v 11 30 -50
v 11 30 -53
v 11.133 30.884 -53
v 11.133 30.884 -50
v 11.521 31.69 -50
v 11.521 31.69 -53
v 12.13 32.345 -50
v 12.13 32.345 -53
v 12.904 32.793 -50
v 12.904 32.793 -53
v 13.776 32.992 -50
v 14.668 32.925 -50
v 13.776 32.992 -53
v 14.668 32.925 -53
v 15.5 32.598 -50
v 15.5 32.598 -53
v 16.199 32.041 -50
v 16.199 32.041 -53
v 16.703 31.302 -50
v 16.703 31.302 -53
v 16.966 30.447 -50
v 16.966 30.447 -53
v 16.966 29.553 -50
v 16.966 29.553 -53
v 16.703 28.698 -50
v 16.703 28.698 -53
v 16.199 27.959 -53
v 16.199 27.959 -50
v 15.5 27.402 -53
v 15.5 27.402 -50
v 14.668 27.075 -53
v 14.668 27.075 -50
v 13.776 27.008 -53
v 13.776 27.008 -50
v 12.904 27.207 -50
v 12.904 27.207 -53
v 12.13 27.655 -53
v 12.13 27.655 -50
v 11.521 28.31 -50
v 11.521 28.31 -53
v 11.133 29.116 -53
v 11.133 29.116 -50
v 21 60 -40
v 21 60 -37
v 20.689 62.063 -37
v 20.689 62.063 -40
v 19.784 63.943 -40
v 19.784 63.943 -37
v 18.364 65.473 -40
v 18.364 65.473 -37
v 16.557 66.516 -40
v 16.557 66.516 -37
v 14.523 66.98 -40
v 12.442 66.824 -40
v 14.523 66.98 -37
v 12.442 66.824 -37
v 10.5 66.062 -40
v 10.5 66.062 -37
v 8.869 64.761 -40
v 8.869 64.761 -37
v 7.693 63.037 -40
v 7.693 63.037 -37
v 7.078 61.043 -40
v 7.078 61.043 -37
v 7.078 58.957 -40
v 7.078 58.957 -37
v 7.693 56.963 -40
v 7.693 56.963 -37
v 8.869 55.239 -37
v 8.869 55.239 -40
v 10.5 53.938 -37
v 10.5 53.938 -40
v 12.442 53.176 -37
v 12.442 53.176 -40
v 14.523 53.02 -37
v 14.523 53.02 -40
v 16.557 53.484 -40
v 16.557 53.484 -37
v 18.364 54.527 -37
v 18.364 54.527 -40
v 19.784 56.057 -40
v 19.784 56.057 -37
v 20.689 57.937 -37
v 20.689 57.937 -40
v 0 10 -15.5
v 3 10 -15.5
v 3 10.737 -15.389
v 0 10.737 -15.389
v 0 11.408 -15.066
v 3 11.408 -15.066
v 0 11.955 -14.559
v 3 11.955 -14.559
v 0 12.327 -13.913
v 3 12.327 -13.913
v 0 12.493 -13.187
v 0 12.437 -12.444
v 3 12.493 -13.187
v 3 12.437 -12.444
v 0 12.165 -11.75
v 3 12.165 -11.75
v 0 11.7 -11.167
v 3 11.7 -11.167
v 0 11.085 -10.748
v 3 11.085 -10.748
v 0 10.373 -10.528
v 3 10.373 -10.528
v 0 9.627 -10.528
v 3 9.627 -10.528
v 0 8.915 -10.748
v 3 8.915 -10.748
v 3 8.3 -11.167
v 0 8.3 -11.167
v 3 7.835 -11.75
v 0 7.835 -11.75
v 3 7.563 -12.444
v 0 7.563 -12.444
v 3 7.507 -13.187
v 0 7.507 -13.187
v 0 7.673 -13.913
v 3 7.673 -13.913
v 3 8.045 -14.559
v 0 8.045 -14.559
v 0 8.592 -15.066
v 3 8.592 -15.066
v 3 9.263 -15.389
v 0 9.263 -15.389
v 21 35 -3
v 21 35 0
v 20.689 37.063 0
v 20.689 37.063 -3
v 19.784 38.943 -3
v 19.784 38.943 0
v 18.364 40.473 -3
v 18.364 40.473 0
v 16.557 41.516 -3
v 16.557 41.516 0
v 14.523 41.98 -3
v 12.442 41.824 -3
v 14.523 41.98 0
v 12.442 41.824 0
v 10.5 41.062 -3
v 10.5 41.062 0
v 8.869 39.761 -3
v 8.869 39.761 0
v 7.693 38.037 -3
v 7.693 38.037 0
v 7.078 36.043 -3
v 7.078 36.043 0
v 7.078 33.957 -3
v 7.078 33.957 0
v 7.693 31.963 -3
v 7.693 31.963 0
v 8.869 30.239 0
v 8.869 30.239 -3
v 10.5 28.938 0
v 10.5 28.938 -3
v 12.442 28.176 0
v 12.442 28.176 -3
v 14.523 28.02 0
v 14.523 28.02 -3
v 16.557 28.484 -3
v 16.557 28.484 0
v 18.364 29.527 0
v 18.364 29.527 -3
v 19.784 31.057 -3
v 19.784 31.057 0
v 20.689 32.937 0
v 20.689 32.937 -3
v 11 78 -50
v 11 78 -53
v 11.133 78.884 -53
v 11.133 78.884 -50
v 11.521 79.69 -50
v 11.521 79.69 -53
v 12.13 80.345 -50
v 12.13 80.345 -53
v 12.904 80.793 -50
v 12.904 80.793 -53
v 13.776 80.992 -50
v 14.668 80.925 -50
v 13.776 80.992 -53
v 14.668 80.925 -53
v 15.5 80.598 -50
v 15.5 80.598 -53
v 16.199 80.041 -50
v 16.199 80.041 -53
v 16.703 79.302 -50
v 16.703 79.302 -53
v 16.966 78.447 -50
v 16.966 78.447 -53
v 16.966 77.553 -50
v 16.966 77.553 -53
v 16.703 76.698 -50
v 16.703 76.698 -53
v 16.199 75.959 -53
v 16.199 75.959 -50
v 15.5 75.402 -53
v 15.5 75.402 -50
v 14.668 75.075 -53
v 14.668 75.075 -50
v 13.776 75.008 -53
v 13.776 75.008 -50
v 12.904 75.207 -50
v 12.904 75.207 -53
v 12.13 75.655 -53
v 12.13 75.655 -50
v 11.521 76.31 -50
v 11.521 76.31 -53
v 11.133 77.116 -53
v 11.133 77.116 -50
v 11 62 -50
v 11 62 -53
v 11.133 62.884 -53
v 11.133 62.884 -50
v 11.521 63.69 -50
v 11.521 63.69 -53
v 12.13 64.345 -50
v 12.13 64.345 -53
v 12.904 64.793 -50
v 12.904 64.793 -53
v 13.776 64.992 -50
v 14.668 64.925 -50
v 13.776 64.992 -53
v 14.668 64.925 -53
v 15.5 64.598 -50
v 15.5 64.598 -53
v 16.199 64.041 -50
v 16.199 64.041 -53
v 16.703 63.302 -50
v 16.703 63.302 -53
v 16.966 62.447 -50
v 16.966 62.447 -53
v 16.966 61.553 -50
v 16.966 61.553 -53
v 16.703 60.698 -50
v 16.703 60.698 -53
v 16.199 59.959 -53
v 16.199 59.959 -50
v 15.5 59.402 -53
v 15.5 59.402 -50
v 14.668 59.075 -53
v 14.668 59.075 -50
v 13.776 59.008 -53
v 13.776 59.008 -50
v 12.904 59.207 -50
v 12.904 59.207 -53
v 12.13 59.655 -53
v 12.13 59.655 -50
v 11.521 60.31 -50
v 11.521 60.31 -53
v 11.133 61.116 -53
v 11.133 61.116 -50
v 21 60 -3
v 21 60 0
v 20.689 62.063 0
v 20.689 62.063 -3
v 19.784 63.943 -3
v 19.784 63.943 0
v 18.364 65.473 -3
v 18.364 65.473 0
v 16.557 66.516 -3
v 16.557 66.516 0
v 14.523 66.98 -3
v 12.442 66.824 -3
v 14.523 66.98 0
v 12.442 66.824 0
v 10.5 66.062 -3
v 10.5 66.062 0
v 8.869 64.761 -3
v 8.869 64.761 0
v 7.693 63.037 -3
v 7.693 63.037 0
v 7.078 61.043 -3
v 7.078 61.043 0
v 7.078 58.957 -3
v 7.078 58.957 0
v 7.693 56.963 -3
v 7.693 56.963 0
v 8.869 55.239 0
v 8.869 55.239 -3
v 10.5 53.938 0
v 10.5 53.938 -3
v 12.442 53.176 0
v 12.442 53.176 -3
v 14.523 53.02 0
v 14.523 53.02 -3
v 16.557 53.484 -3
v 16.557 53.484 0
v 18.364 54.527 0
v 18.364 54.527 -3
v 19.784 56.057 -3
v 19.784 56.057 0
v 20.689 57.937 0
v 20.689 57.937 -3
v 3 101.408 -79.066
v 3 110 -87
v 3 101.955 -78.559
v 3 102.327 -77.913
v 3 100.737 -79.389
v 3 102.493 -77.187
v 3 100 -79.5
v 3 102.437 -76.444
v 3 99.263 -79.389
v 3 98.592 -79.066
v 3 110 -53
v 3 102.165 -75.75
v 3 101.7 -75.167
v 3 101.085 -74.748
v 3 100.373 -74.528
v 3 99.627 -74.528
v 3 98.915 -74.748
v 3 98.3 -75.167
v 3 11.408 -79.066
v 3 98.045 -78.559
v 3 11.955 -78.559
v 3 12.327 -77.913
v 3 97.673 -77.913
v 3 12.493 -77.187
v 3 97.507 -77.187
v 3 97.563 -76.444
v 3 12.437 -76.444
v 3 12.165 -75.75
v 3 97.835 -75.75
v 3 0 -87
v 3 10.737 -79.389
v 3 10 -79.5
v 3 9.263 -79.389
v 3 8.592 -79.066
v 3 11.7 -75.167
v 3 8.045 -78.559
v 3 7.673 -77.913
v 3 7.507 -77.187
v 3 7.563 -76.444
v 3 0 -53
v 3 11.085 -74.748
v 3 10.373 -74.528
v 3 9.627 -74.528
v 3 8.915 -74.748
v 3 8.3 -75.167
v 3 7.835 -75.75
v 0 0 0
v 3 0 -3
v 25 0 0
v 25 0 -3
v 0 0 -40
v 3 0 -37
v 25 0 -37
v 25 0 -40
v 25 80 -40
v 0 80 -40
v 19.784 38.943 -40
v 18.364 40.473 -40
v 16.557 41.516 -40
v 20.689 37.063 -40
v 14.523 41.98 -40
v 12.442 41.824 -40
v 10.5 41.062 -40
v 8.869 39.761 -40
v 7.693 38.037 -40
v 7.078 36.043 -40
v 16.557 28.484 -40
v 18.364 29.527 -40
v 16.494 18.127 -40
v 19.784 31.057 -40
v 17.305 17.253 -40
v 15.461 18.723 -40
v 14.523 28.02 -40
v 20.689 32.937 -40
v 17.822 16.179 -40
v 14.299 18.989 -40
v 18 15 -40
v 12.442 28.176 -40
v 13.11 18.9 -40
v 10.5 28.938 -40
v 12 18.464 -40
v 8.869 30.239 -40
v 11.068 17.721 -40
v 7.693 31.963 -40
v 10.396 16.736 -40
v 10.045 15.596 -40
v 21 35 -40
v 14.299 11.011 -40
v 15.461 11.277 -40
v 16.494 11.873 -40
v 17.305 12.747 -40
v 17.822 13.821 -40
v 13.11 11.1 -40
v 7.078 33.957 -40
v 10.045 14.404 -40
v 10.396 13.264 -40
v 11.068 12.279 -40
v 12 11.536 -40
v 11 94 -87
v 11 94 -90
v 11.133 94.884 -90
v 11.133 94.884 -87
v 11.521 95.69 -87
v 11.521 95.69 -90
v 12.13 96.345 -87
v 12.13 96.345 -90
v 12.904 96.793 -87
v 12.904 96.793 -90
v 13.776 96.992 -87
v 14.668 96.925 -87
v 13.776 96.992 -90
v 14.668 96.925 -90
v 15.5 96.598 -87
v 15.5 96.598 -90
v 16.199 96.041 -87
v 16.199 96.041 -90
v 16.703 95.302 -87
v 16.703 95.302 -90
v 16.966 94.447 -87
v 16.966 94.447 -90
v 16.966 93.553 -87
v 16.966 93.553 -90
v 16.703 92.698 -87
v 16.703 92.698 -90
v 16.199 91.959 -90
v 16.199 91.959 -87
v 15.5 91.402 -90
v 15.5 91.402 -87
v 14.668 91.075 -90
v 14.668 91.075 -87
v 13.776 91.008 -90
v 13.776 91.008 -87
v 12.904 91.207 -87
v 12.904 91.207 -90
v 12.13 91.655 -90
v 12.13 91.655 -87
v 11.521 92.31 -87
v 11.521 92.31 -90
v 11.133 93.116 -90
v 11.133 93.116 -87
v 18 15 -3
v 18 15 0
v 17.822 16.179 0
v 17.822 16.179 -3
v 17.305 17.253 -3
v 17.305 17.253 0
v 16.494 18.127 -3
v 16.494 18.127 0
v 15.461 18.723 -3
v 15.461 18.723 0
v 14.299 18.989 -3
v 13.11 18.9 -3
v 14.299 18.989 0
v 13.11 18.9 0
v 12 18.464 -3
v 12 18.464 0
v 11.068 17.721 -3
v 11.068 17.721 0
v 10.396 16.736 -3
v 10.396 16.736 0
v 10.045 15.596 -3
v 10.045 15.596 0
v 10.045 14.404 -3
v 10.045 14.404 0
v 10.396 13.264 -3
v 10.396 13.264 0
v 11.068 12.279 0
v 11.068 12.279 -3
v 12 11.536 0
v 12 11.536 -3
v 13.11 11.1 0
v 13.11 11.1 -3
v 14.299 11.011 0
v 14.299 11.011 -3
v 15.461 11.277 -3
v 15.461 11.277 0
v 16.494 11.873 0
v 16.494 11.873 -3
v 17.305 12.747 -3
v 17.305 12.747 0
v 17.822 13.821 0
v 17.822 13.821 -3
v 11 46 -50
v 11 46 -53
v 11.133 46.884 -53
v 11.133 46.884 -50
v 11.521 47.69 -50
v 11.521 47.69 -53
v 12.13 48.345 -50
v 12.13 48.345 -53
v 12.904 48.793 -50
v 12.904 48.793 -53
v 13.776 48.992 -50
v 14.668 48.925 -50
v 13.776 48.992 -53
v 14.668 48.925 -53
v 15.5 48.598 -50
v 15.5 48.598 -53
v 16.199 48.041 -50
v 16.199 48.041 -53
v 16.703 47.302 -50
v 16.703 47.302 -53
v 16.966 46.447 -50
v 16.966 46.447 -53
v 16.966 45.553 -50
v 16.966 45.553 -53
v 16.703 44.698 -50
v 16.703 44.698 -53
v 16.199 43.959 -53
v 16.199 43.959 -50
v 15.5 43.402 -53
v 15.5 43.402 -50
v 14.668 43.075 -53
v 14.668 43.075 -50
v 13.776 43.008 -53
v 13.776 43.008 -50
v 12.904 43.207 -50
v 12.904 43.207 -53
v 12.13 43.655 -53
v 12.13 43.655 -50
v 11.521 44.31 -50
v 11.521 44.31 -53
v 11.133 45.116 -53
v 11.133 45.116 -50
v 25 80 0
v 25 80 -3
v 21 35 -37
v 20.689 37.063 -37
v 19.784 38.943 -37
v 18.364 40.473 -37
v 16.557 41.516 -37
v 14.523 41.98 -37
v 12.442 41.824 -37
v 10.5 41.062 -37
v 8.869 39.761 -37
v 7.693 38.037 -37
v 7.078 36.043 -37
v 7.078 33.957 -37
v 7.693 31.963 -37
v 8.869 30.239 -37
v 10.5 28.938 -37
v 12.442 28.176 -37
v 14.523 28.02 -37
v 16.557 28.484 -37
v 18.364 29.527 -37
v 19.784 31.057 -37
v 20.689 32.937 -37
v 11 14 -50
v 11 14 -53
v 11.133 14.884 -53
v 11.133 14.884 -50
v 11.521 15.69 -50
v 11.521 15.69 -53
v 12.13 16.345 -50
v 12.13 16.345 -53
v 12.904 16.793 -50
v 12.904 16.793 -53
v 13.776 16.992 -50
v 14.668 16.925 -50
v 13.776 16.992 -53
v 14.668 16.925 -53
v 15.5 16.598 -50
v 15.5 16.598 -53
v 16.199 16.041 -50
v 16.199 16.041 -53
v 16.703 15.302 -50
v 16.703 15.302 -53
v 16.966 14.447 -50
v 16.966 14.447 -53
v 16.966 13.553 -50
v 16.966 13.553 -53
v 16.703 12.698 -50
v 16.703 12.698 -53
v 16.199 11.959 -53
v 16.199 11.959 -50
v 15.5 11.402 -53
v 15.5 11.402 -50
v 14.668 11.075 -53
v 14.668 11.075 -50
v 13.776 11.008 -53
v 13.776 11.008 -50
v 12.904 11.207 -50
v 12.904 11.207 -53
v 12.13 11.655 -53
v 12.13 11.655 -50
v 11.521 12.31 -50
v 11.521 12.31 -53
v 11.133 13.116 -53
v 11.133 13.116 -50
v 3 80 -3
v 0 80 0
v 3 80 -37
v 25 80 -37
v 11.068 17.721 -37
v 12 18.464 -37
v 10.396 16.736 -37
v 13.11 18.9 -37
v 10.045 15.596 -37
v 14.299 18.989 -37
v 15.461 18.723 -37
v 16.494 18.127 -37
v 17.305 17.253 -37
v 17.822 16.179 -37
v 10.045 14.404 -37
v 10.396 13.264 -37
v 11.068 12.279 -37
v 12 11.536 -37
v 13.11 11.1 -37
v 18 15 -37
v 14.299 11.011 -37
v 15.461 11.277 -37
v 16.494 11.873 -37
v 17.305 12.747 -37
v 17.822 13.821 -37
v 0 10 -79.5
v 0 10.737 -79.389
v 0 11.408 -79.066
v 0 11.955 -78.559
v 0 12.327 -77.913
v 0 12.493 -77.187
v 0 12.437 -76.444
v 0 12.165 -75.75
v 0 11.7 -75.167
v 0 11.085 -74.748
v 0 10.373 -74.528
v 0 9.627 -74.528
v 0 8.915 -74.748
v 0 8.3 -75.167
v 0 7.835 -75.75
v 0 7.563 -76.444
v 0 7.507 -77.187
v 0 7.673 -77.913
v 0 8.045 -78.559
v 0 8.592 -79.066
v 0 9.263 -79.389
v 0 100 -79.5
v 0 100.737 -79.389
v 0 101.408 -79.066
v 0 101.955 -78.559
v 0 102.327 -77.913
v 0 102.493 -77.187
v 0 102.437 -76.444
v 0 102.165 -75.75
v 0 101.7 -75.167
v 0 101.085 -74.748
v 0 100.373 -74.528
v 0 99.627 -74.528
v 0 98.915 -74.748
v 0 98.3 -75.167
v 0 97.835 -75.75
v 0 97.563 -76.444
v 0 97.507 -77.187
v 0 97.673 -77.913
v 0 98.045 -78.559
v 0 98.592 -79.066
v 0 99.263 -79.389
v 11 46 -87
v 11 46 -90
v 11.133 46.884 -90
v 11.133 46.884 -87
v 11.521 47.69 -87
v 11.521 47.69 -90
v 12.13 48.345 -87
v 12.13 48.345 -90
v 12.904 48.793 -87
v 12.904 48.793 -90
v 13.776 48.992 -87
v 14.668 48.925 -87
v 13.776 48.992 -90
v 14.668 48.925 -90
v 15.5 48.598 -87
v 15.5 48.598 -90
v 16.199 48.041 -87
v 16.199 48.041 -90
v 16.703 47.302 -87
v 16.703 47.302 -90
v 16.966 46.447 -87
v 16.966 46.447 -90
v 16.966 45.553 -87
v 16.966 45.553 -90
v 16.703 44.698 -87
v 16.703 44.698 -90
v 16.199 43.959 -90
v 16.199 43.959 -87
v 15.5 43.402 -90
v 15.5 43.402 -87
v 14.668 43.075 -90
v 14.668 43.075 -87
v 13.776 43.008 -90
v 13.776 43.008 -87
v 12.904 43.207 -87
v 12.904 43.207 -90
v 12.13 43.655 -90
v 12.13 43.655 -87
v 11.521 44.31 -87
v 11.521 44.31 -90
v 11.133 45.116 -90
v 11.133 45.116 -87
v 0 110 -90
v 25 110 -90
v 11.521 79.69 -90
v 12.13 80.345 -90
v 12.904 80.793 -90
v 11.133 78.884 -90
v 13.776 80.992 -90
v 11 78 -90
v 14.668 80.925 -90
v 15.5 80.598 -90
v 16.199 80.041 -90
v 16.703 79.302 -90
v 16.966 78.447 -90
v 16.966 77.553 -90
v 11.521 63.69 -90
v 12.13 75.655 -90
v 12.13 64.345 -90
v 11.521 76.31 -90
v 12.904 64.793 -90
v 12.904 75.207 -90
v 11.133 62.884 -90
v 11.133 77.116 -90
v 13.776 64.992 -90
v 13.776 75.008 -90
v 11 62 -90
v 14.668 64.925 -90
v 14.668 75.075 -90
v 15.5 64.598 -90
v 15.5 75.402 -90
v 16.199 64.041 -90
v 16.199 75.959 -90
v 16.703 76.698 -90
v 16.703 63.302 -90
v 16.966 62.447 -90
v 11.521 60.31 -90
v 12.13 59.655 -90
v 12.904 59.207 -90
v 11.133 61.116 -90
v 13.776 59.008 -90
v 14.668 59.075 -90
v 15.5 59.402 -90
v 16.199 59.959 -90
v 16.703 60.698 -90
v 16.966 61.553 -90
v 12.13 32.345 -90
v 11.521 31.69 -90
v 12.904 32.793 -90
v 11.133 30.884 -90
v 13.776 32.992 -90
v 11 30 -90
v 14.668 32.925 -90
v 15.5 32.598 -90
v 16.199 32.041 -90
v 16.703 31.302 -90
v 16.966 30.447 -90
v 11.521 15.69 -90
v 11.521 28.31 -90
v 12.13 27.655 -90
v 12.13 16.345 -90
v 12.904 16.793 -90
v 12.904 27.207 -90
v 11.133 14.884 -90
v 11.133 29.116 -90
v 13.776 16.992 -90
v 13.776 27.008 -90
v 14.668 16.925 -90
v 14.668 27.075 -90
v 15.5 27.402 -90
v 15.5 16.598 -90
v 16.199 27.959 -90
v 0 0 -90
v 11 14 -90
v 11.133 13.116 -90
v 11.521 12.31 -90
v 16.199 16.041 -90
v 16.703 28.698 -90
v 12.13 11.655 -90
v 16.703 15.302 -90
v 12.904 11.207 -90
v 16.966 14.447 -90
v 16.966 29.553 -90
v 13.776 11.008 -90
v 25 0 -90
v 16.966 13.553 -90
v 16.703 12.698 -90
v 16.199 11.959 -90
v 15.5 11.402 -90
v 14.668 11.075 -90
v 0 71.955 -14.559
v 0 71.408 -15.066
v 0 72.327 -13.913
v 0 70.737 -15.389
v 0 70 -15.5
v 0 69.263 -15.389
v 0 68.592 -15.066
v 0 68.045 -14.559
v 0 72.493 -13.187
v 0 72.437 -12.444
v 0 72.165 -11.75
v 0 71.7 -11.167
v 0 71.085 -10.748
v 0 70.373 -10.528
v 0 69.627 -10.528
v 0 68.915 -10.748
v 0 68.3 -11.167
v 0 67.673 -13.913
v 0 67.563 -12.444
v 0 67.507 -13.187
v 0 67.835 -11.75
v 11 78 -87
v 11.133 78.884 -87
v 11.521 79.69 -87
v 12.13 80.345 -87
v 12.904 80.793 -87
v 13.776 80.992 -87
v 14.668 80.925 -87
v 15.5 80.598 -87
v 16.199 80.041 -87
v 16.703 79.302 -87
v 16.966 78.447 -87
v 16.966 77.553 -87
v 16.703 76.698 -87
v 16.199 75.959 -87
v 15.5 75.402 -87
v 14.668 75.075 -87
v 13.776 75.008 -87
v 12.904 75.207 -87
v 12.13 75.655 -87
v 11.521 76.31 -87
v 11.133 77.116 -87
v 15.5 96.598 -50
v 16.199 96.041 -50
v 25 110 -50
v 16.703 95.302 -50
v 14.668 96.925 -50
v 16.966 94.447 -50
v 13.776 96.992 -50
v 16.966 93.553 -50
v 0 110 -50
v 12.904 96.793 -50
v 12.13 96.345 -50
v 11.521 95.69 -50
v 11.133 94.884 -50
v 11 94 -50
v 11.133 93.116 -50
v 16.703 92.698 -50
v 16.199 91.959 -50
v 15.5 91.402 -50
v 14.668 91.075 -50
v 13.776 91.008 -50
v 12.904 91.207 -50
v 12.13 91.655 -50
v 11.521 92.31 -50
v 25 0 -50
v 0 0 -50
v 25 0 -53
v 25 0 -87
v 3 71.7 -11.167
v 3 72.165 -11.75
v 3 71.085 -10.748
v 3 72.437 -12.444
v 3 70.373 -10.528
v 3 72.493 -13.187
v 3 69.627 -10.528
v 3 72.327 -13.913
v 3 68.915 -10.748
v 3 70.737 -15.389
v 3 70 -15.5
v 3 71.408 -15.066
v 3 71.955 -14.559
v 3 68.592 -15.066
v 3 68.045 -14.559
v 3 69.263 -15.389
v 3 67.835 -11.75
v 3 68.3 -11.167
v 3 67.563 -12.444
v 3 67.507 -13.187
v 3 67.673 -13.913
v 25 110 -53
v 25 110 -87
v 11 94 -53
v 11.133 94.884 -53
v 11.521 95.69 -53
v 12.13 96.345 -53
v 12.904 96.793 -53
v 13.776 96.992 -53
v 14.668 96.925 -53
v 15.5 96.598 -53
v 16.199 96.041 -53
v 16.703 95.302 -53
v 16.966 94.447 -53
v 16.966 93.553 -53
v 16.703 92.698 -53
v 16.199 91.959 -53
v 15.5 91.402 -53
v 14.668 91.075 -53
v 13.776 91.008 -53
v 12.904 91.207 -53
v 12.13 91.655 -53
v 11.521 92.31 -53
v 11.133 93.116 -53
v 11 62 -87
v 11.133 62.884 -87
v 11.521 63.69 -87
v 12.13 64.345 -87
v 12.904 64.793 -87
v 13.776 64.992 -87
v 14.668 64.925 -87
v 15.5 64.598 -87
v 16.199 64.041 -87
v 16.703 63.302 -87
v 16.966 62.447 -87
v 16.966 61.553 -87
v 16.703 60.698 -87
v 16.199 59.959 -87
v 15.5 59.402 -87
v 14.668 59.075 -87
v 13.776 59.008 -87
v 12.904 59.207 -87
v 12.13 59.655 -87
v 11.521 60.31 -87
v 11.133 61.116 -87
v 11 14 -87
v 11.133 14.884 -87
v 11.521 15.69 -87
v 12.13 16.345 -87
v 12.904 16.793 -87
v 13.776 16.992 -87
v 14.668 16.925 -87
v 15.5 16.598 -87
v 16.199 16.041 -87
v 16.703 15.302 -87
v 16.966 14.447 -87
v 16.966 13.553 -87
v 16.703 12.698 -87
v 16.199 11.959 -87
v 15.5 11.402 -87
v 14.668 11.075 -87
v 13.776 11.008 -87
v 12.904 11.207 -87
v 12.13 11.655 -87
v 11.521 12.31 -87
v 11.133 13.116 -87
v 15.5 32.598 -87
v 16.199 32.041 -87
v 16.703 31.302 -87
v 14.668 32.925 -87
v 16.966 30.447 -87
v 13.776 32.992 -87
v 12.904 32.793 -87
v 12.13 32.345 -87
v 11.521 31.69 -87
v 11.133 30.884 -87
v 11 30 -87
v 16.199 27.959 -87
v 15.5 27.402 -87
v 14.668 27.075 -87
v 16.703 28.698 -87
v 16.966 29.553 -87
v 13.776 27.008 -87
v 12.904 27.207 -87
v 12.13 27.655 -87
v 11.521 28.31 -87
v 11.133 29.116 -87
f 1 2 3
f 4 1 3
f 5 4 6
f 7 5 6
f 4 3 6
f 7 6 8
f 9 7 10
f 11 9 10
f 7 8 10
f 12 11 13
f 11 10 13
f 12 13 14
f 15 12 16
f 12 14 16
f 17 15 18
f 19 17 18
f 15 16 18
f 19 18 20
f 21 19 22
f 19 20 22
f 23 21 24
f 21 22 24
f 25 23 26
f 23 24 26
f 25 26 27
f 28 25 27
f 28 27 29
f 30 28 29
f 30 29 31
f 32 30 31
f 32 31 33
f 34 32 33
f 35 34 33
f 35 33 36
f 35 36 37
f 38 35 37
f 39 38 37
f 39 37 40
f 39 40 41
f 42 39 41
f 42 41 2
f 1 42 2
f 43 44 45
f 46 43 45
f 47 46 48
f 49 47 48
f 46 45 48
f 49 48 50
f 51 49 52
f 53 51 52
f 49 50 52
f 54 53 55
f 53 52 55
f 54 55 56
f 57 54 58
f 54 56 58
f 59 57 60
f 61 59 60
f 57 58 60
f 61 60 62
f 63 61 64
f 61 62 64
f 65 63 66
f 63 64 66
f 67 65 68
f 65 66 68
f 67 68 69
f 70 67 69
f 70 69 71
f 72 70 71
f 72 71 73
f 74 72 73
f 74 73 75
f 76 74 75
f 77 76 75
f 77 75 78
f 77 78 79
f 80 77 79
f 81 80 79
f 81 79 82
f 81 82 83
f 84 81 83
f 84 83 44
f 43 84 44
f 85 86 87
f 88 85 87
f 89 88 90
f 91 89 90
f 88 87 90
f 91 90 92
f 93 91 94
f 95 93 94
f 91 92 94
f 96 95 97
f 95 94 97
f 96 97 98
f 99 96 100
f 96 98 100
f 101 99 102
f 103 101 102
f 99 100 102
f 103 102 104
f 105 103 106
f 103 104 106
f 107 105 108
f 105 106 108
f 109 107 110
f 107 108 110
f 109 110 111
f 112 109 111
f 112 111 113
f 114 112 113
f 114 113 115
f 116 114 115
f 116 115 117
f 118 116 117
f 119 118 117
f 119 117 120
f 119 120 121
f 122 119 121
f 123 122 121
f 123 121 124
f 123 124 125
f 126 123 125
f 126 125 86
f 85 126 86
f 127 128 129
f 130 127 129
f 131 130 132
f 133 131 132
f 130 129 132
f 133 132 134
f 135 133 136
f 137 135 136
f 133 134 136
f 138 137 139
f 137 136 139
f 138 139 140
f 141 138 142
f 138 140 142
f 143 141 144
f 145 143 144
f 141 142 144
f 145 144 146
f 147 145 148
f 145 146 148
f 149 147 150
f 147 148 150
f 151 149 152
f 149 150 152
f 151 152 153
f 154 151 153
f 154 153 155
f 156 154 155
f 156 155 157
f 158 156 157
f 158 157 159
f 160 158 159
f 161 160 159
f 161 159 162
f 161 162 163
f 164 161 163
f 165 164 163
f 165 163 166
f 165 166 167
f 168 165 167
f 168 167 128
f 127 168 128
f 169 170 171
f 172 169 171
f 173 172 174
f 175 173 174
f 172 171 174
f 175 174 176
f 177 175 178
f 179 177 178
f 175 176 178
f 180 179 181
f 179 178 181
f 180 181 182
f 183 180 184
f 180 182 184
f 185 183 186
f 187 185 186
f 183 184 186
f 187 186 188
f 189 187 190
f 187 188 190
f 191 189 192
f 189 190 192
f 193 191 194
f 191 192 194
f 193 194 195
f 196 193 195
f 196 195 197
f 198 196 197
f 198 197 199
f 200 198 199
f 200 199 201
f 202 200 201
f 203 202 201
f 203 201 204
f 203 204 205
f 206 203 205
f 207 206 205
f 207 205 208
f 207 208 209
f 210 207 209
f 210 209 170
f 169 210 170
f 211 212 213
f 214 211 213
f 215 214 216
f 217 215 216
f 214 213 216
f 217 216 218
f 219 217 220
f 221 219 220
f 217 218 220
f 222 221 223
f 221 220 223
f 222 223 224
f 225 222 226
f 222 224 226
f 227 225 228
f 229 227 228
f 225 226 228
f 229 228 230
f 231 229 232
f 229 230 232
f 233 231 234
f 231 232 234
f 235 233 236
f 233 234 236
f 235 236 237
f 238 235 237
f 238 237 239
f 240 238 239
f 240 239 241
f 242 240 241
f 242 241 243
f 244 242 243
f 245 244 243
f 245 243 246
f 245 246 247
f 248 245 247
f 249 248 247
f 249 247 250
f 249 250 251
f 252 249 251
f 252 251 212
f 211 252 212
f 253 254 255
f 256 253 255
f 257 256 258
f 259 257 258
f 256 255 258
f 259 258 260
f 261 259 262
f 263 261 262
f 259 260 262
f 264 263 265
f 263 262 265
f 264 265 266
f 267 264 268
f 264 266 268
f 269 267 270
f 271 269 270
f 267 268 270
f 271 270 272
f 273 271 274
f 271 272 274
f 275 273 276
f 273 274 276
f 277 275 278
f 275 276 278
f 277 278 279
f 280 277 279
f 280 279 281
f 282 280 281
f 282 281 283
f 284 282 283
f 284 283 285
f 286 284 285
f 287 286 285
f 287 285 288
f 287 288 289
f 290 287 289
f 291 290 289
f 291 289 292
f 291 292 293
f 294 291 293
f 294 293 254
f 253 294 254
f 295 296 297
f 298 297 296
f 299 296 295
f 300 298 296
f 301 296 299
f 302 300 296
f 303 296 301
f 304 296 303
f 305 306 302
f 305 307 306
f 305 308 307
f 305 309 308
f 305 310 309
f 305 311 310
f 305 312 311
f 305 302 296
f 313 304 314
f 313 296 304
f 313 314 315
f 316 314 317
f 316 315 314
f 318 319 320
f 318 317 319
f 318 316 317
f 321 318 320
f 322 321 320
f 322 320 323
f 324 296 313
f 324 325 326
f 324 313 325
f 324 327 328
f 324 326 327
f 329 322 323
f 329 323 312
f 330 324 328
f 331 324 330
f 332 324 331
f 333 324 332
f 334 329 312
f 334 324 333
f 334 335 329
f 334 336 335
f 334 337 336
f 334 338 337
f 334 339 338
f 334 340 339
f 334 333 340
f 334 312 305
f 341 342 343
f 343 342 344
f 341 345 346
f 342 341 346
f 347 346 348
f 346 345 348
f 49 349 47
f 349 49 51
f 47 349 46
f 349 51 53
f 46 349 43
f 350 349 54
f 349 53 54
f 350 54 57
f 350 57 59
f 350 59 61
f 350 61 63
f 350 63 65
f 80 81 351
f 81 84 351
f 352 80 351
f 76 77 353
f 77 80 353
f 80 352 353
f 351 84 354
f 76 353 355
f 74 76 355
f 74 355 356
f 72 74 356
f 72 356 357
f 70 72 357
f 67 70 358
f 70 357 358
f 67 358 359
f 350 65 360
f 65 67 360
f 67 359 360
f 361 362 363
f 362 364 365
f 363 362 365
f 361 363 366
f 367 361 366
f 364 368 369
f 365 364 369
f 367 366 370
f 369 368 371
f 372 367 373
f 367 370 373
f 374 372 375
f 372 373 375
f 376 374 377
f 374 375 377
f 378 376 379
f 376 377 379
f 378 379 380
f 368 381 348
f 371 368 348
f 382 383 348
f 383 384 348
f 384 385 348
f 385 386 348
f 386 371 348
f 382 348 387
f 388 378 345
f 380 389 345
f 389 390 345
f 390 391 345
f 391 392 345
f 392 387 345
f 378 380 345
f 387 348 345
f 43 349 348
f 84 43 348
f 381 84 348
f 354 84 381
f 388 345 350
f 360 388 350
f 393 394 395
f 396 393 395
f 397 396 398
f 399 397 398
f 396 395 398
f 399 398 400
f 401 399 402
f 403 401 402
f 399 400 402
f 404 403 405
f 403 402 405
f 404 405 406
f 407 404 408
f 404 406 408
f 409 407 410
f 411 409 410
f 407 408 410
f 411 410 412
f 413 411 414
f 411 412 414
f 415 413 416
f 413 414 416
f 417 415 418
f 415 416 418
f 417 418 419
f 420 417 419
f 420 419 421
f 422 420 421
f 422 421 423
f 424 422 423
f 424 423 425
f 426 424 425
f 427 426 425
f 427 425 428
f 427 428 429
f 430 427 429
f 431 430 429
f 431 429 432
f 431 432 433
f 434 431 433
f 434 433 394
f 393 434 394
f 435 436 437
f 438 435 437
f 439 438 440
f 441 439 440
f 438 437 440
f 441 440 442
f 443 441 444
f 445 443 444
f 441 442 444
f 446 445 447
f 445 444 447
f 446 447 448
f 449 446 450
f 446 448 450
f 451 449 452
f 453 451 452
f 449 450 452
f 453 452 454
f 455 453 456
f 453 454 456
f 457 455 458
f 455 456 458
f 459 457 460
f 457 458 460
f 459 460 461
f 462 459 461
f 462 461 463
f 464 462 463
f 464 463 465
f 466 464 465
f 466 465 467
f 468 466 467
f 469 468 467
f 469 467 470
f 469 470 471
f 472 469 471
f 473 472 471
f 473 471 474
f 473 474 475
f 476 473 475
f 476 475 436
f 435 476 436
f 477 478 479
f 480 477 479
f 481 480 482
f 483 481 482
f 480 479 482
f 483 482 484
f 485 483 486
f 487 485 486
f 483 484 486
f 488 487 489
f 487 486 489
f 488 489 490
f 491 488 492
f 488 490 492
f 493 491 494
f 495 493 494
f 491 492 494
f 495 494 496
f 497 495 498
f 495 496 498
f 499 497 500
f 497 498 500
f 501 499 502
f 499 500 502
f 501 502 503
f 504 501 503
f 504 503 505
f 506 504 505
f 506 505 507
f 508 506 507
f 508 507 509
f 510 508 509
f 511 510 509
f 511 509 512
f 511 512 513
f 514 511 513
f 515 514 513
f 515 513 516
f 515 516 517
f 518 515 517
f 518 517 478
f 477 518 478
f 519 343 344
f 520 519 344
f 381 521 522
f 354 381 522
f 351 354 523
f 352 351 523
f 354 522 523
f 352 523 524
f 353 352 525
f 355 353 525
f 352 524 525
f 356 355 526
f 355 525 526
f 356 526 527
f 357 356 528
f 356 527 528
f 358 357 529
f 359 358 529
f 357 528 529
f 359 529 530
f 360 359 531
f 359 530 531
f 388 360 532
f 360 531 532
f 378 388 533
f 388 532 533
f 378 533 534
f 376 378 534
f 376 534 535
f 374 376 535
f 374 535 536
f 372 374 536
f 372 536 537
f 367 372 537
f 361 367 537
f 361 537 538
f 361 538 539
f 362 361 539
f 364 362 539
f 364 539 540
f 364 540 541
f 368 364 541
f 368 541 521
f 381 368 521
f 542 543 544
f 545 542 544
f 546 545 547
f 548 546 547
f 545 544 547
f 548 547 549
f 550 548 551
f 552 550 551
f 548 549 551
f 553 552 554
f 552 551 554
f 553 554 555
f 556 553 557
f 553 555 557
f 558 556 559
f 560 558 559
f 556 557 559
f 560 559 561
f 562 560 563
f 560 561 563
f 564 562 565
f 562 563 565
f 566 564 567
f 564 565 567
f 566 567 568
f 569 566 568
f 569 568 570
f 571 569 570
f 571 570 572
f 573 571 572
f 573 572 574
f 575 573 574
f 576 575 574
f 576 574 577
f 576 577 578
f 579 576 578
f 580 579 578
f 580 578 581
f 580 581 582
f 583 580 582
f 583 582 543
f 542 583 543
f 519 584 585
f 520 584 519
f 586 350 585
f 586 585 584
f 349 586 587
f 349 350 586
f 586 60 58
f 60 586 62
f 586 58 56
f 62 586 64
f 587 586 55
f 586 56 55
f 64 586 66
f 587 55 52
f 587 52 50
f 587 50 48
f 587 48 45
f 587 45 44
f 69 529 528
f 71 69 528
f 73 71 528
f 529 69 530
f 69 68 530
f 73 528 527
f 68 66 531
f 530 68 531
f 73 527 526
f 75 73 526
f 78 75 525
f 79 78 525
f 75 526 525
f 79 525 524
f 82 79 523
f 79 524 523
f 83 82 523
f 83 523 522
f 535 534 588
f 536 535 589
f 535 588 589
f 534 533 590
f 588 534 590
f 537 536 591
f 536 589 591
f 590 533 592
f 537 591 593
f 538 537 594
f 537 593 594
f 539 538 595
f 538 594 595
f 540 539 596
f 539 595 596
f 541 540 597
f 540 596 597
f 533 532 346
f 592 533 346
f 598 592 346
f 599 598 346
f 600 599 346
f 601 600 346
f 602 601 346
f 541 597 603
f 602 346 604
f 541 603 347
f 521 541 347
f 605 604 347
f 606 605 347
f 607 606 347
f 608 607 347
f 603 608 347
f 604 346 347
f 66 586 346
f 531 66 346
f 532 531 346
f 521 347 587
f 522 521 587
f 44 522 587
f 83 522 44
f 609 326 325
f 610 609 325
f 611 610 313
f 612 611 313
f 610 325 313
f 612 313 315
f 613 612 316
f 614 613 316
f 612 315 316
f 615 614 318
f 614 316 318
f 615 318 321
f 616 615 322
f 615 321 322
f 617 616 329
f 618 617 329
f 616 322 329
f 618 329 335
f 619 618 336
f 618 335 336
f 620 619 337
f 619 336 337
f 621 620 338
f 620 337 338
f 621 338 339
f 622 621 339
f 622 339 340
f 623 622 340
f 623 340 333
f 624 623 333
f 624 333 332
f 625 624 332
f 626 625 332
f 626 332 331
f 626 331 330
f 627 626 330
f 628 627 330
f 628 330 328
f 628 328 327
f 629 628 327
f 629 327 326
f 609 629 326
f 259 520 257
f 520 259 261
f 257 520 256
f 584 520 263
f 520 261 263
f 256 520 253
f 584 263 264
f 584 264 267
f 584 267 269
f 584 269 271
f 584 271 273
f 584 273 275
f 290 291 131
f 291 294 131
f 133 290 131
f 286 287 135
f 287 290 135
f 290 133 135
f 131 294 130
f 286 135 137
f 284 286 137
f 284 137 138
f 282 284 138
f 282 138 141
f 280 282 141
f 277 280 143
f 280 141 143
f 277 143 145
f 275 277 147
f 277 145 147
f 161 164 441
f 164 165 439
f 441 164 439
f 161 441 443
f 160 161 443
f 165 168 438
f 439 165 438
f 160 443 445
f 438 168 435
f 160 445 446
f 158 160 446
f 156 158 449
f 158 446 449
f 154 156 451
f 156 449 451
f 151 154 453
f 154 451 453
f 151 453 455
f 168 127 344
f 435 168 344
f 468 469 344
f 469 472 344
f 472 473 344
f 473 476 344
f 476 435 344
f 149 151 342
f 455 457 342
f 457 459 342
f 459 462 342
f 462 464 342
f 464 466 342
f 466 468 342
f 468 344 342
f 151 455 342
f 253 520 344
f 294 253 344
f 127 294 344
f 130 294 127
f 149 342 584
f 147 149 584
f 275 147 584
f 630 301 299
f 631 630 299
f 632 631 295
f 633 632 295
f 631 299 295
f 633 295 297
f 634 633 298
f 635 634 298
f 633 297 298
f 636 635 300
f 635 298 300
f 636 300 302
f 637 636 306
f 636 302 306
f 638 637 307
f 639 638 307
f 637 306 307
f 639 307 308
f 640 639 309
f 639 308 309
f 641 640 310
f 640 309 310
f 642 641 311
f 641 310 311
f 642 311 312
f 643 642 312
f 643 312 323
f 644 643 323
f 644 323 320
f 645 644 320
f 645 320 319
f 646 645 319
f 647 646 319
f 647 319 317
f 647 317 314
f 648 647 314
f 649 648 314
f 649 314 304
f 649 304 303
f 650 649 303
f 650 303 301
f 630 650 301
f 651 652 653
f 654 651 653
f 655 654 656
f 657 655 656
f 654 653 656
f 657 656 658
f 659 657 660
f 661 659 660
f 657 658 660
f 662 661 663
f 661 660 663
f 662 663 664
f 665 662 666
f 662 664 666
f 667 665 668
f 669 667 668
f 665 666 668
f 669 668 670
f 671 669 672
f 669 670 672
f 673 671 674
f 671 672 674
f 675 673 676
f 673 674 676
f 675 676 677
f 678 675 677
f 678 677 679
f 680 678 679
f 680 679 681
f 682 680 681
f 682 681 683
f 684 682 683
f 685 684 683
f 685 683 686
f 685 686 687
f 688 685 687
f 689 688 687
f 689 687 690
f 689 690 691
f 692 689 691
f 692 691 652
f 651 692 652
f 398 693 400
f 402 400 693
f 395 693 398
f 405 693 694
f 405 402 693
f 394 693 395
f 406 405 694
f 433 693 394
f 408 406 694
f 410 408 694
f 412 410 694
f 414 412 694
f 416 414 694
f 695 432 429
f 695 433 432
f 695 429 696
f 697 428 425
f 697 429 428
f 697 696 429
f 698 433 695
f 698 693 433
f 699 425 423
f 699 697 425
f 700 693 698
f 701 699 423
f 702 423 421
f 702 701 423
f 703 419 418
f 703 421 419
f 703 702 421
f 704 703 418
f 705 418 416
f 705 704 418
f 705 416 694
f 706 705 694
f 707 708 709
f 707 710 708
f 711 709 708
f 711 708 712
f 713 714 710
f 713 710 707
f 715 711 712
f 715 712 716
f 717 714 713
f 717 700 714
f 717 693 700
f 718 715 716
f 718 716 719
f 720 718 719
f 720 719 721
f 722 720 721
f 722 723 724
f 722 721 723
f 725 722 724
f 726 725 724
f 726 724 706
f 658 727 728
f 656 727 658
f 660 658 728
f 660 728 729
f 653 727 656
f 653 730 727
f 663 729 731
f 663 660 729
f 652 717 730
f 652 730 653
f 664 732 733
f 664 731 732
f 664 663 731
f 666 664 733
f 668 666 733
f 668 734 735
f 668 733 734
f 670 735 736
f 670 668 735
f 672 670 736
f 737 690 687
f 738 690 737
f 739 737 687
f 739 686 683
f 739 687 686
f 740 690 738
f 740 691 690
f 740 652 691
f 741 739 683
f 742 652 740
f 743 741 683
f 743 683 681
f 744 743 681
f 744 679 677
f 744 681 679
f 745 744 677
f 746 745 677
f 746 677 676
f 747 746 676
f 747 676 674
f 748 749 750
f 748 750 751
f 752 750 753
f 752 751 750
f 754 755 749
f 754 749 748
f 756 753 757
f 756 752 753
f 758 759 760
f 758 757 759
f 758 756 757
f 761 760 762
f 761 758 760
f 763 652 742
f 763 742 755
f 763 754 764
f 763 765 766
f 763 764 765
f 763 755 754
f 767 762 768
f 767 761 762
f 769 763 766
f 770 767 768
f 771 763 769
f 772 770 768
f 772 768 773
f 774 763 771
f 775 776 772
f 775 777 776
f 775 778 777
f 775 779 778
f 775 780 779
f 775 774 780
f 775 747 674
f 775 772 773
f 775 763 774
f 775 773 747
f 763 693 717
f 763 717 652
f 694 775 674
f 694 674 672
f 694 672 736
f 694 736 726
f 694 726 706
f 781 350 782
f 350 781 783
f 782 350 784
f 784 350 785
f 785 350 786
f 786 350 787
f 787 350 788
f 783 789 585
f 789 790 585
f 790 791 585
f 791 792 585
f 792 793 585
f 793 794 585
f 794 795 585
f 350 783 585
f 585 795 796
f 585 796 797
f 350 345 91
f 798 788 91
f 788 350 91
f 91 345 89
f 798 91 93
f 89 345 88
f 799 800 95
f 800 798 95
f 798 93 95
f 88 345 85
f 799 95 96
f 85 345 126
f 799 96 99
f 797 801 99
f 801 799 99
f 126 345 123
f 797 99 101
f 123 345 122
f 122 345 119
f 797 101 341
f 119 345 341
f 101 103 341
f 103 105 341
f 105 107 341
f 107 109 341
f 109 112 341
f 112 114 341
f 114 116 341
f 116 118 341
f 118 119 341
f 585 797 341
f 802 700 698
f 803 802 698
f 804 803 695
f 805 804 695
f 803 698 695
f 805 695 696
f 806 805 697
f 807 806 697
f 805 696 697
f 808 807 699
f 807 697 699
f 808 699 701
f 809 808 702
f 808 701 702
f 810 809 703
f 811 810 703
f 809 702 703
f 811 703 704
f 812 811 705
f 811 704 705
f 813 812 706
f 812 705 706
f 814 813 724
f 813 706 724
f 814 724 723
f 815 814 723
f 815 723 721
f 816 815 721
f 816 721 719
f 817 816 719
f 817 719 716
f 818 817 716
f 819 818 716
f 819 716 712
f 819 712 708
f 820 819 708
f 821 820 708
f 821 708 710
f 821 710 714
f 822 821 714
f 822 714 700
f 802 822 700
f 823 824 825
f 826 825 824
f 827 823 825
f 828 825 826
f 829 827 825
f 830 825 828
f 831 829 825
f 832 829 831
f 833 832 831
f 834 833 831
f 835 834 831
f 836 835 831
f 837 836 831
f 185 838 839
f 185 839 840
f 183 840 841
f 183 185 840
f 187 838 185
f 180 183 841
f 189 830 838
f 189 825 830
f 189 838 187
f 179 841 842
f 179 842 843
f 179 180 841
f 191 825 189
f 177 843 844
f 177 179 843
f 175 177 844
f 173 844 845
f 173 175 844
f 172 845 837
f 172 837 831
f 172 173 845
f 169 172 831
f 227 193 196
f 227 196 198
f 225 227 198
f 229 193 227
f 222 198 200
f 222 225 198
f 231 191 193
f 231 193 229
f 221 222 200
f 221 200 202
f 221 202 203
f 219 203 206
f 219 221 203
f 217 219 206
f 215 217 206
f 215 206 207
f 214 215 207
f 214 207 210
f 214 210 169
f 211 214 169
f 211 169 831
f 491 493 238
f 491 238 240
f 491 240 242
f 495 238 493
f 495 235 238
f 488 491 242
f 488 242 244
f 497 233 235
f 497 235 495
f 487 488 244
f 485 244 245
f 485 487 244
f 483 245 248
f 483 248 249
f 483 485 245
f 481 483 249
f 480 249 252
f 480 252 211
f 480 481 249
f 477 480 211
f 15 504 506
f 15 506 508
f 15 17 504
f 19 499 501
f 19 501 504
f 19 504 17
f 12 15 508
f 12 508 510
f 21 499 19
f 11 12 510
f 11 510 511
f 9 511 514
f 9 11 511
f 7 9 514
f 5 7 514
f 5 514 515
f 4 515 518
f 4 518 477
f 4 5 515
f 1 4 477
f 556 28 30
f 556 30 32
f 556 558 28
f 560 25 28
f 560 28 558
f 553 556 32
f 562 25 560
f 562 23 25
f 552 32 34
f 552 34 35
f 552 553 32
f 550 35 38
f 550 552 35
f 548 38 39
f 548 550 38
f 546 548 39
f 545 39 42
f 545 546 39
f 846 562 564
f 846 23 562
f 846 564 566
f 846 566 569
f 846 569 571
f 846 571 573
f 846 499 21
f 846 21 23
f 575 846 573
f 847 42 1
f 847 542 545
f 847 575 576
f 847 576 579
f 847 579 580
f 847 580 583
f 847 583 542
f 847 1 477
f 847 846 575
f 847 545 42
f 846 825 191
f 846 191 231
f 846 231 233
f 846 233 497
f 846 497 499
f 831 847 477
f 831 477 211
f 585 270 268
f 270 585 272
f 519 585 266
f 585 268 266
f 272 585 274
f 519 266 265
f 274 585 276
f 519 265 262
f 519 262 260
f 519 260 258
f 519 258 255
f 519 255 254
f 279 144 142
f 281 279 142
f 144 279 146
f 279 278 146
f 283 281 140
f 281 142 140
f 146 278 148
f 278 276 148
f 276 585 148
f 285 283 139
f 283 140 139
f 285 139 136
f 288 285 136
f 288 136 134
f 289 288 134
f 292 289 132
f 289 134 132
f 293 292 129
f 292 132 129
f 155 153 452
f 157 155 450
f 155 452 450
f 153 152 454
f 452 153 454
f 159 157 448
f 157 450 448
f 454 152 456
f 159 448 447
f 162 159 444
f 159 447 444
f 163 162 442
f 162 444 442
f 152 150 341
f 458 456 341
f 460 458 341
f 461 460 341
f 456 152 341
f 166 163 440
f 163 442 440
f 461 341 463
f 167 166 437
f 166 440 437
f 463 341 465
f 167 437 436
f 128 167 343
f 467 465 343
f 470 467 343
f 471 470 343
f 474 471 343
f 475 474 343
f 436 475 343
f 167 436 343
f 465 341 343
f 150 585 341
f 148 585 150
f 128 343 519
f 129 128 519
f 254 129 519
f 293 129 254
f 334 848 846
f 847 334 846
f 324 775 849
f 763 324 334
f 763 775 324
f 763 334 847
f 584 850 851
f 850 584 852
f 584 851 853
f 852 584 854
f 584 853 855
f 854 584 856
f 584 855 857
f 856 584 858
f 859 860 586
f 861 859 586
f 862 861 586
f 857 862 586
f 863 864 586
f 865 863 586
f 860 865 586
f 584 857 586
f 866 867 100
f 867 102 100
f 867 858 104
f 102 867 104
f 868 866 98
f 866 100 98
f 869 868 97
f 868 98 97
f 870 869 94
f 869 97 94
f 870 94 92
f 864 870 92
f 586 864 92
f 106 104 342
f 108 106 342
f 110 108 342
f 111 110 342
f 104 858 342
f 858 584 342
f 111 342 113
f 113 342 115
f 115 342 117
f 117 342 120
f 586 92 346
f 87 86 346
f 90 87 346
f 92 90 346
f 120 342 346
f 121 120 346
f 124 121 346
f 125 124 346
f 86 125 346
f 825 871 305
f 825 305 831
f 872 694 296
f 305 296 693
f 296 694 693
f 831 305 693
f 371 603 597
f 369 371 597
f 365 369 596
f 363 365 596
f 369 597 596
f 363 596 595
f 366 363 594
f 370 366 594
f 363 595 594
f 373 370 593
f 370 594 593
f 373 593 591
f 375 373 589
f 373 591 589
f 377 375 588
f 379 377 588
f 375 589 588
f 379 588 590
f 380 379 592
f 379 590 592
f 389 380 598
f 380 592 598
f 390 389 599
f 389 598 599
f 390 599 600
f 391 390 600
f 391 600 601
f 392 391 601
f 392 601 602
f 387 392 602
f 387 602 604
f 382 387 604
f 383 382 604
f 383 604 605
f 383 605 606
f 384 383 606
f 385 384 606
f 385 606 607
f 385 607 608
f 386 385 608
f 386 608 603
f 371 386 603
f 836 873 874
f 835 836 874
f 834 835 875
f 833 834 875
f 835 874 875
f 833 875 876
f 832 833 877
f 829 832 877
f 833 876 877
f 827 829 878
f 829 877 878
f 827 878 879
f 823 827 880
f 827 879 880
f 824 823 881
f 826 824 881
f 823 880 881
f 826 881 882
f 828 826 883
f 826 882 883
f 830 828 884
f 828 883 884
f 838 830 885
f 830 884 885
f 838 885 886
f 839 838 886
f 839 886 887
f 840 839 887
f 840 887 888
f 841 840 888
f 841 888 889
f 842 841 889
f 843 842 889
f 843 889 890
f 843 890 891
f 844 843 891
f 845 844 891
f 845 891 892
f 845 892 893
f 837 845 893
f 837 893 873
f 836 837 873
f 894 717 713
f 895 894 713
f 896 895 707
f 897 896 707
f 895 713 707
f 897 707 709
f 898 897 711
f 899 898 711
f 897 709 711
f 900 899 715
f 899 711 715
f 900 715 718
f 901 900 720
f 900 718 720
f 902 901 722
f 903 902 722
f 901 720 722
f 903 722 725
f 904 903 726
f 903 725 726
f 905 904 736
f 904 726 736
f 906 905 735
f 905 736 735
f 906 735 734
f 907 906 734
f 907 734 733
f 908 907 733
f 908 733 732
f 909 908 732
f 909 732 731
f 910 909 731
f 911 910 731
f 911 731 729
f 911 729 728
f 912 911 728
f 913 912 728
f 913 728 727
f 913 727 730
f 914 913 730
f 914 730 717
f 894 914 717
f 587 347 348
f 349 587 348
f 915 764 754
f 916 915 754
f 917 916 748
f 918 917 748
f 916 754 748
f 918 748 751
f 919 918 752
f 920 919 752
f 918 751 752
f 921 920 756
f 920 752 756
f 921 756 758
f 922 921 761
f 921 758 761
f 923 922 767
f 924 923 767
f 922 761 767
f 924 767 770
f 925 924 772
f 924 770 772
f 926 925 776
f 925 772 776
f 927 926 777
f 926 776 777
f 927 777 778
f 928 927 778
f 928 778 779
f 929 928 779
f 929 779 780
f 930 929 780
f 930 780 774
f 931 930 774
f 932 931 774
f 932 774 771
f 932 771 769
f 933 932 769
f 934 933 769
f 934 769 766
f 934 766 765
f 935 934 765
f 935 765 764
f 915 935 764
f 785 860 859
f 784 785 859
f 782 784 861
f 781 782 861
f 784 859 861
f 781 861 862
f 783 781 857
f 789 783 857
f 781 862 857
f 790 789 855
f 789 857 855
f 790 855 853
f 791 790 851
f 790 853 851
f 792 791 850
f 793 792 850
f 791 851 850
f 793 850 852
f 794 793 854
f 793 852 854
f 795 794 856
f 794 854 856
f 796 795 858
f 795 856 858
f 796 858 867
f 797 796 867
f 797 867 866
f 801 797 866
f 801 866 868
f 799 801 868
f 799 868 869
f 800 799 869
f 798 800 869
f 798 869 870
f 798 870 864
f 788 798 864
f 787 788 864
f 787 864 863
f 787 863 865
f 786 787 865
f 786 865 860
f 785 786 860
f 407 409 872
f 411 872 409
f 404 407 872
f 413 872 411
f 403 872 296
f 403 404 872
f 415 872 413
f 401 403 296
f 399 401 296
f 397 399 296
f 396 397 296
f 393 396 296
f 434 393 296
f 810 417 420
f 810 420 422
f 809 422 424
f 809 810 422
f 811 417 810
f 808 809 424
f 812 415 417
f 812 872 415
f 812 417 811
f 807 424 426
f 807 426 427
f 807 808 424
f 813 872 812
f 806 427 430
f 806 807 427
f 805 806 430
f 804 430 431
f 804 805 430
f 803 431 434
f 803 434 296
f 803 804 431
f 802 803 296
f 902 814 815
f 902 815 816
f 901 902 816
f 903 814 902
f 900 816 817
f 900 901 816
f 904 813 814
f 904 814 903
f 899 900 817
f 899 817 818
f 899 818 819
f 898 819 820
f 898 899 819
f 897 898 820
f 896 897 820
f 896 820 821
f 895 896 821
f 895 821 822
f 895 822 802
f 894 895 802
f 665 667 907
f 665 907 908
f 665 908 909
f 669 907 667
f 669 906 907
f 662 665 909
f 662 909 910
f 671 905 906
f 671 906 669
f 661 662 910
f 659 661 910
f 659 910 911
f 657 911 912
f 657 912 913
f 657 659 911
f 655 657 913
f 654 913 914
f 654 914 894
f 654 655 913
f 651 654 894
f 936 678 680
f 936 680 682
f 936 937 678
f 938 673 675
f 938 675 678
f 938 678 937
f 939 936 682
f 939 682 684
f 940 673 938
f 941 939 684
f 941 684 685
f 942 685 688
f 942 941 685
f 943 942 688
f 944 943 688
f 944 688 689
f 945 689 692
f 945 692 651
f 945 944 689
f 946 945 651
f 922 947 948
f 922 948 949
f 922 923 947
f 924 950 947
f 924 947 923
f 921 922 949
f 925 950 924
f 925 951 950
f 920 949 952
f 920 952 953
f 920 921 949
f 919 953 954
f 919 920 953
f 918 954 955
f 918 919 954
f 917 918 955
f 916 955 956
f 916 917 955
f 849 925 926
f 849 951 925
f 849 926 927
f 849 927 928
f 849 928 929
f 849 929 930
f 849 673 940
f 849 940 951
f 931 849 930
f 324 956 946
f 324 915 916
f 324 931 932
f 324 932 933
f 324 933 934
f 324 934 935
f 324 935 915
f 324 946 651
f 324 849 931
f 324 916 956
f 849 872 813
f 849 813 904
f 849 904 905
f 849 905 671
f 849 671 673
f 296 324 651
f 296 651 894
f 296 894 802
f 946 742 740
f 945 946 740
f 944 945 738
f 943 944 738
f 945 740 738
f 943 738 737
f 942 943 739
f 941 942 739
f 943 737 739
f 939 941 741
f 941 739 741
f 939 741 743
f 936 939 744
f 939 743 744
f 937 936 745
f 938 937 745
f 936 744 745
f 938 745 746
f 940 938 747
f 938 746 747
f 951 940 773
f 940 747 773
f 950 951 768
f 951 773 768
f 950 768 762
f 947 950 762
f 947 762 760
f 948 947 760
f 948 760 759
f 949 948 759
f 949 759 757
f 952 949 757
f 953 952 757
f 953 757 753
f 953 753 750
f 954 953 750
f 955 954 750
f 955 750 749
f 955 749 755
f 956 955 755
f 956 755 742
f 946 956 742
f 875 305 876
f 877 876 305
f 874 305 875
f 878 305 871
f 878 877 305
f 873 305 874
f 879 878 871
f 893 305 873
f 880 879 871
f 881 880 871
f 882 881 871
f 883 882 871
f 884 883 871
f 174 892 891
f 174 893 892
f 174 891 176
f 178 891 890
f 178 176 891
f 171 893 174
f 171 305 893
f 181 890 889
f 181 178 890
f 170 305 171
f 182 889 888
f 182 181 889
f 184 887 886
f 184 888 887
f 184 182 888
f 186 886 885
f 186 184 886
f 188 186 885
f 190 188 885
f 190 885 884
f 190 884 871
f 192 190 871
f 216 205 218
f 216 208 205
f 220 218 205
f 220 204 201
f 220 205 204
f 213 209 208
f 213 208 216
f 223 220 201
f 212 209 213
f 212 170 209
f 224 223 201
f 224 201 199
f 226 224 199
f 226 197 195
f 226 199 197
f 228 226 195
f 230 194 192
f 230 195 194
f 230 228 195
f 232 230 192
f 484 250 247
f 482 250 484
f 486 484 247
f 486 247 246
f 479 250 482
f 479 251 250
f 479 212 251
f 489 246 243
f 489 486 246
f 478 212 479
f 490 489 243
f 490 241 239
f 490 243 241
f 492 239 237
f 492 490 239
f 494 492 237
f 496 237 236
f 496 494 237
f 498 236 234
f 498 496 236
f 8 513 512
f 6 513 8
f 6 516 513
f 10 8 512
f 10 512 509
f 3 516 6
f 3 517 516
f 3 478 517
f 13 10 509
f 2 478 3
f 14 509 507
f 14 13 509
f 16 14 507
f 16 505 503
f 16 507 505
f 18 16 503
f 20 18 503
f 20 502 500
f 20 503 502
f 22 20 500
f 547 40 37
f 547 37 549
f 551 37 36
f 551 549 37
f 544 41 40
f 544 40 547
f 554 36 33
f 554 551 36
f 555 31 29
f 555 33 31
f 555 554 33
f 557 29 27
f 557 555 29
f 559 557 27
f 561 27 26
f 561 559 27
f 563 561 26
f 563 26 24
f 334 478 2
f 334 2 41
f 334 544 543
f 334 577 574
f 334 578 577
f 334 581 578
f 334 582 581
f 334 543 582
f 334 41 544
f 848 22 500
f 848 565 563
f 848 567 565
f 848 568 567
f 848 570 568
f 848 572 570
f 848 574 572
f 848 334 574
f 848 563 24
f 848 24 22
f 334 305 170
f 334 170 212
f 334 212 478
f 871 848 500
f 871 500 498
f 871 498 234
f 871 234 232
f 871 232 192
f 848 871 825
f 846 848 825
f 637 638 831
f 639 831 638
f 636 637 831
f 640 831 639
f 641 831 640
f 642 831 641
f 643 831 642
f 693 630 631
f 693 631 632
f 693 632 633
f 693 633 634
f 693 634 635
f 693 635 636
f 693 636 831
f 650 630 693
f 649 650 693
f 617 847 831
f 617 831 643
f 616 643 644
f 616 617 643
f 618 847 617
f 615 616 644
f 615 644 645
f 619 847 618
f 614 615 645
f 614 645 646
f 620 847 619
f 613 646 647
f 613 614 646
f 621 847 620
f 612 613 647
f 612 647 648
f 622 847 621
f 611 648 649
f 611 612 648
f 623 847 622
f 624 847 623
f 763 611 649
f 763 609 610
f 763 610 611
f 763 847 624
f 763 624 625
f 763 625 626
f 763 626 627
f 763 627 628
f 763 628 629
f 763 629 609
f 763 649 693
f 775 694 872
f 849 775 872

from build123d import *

# Parameters (mm, degrees)
EXTRUDE_2_DEPTH     = 80
EXTRUDE_3_DEPTH     = 110
SKETCH_6_R          = 7
SKETCH_6_R_2        = 4
CUT_EXTRUDE_2_DEPTH = 40
SKETCH_7_R          = 3
CUT_EXTRUDE_3_DEPTH = 40
SKETCH_8_R          = 2.5
CUT_EXTRUDE_4_DEPTH = 40


with BuildPart() as part:
    # 스케치1 → 보스-돌출2 (new body)
    with BuildSketch(Plane(origin=(0, 0, 0), x_dir=(1, 0, 0), z_dir=(0, 1, 0))):
        Polygon((0, 0), (25, 0), (25, 3), (3, 3), (3, 37), (25, 37), (25, 40), (0, 40), align=None)
    extrude(amount=EXTRUDE_2_DEPTH)

    # 스케치6 → 컷-돌출2 (cut)
    with BuildSketch(Plane.XY):
        with Locations((14, 60)):
            Circle(SKETCH_6_R)
        with Locations((14, 35)):
            Circle(SKETCH_6_R)
        with Locations((14, 15)):
            Circle(SKETCH_6_R_2)
    extrude(amount=-CUT_EXTRUDE_2_DEPTH, mode=Mode.SUBTRACT)


with BuildPart() as body_2:
    # 스케치1<4> → 보스-돌출3 (new body)
    with BuildSketch(Plane(origin=(0, 0, 0), x_dir=(1, 0, 0), z_dir=(0, 1, 0))):
        Polygon((25, 90), (25, 87), (3, 87), (3, 53), (25, 53), (25, 50), (0, 50), (0, 90), align=None)
    extrude(amount=EXTRUDE_3_DEPTH)

    # 스케치7 → 컷-돌출3 (cut)
    with BuildSketch(Plane(origin=(0, 0, -90), x_dir=(-1, 0, 0), z_dir=(0, 0, -1))):
        with Locations((-14, 94)):
            Circle(SKETCH_7_R)
        with Locations((-14, 78)):
            Circle(SKETCH_7_R)
        with Locations((-14, 62)):
            Circle(SKETCH_7_R)
        with Locations((-14, 46)):
            Circle(SKETCH_7_R)
        with Locations((-14, 30)):
            Circle(SKETCH_7_R)
        with Locations((-14, 14)):
            Circle(SKETCH_7_R)
    extrude(amount=-CUT_EXTRUDE_3_DEPTH, mode=Mode.SUBTRACT)


with BuildPart() as cut_extrude_4_tool:
    # 스케치8 → 컷-돌출4 (new body)
    with BuildSketch(Plane(origin=(3, 0, 0), x_dir=(0, 0, -1), z_dir=(1, 0, 0))):
        with Locations((77, 100)):
            Circle(SKETCH_8_R)
        with Locations((77, 10)):
            Circle(SKETCH_8_R)
        with Locations((13, 10)):
            Circle(SKETCH_8_R)
        with Locations((13, 70)):
            Circle(SKETCH_8_R)
    extrude(amount=-CUT_EXTRUDE_4_DEPTH)


with BuildPart() as part_1:
    add(part.part)

    # 컷-돌출4: cut by cut_extrude_4_tool
    add(cut_extrude_4_tool.part, mode=Mode.SUBTRACT)


with BuildPart() as body_2_1:
    add(body_2.part)

    # 컷-돌출4: cut by cut_extrude_4_tool
    add(cut_extrude_4_tool.part, mode=Mode.SUBTRACT)


solid = Compound([part_1.part, body_2_1.part])
